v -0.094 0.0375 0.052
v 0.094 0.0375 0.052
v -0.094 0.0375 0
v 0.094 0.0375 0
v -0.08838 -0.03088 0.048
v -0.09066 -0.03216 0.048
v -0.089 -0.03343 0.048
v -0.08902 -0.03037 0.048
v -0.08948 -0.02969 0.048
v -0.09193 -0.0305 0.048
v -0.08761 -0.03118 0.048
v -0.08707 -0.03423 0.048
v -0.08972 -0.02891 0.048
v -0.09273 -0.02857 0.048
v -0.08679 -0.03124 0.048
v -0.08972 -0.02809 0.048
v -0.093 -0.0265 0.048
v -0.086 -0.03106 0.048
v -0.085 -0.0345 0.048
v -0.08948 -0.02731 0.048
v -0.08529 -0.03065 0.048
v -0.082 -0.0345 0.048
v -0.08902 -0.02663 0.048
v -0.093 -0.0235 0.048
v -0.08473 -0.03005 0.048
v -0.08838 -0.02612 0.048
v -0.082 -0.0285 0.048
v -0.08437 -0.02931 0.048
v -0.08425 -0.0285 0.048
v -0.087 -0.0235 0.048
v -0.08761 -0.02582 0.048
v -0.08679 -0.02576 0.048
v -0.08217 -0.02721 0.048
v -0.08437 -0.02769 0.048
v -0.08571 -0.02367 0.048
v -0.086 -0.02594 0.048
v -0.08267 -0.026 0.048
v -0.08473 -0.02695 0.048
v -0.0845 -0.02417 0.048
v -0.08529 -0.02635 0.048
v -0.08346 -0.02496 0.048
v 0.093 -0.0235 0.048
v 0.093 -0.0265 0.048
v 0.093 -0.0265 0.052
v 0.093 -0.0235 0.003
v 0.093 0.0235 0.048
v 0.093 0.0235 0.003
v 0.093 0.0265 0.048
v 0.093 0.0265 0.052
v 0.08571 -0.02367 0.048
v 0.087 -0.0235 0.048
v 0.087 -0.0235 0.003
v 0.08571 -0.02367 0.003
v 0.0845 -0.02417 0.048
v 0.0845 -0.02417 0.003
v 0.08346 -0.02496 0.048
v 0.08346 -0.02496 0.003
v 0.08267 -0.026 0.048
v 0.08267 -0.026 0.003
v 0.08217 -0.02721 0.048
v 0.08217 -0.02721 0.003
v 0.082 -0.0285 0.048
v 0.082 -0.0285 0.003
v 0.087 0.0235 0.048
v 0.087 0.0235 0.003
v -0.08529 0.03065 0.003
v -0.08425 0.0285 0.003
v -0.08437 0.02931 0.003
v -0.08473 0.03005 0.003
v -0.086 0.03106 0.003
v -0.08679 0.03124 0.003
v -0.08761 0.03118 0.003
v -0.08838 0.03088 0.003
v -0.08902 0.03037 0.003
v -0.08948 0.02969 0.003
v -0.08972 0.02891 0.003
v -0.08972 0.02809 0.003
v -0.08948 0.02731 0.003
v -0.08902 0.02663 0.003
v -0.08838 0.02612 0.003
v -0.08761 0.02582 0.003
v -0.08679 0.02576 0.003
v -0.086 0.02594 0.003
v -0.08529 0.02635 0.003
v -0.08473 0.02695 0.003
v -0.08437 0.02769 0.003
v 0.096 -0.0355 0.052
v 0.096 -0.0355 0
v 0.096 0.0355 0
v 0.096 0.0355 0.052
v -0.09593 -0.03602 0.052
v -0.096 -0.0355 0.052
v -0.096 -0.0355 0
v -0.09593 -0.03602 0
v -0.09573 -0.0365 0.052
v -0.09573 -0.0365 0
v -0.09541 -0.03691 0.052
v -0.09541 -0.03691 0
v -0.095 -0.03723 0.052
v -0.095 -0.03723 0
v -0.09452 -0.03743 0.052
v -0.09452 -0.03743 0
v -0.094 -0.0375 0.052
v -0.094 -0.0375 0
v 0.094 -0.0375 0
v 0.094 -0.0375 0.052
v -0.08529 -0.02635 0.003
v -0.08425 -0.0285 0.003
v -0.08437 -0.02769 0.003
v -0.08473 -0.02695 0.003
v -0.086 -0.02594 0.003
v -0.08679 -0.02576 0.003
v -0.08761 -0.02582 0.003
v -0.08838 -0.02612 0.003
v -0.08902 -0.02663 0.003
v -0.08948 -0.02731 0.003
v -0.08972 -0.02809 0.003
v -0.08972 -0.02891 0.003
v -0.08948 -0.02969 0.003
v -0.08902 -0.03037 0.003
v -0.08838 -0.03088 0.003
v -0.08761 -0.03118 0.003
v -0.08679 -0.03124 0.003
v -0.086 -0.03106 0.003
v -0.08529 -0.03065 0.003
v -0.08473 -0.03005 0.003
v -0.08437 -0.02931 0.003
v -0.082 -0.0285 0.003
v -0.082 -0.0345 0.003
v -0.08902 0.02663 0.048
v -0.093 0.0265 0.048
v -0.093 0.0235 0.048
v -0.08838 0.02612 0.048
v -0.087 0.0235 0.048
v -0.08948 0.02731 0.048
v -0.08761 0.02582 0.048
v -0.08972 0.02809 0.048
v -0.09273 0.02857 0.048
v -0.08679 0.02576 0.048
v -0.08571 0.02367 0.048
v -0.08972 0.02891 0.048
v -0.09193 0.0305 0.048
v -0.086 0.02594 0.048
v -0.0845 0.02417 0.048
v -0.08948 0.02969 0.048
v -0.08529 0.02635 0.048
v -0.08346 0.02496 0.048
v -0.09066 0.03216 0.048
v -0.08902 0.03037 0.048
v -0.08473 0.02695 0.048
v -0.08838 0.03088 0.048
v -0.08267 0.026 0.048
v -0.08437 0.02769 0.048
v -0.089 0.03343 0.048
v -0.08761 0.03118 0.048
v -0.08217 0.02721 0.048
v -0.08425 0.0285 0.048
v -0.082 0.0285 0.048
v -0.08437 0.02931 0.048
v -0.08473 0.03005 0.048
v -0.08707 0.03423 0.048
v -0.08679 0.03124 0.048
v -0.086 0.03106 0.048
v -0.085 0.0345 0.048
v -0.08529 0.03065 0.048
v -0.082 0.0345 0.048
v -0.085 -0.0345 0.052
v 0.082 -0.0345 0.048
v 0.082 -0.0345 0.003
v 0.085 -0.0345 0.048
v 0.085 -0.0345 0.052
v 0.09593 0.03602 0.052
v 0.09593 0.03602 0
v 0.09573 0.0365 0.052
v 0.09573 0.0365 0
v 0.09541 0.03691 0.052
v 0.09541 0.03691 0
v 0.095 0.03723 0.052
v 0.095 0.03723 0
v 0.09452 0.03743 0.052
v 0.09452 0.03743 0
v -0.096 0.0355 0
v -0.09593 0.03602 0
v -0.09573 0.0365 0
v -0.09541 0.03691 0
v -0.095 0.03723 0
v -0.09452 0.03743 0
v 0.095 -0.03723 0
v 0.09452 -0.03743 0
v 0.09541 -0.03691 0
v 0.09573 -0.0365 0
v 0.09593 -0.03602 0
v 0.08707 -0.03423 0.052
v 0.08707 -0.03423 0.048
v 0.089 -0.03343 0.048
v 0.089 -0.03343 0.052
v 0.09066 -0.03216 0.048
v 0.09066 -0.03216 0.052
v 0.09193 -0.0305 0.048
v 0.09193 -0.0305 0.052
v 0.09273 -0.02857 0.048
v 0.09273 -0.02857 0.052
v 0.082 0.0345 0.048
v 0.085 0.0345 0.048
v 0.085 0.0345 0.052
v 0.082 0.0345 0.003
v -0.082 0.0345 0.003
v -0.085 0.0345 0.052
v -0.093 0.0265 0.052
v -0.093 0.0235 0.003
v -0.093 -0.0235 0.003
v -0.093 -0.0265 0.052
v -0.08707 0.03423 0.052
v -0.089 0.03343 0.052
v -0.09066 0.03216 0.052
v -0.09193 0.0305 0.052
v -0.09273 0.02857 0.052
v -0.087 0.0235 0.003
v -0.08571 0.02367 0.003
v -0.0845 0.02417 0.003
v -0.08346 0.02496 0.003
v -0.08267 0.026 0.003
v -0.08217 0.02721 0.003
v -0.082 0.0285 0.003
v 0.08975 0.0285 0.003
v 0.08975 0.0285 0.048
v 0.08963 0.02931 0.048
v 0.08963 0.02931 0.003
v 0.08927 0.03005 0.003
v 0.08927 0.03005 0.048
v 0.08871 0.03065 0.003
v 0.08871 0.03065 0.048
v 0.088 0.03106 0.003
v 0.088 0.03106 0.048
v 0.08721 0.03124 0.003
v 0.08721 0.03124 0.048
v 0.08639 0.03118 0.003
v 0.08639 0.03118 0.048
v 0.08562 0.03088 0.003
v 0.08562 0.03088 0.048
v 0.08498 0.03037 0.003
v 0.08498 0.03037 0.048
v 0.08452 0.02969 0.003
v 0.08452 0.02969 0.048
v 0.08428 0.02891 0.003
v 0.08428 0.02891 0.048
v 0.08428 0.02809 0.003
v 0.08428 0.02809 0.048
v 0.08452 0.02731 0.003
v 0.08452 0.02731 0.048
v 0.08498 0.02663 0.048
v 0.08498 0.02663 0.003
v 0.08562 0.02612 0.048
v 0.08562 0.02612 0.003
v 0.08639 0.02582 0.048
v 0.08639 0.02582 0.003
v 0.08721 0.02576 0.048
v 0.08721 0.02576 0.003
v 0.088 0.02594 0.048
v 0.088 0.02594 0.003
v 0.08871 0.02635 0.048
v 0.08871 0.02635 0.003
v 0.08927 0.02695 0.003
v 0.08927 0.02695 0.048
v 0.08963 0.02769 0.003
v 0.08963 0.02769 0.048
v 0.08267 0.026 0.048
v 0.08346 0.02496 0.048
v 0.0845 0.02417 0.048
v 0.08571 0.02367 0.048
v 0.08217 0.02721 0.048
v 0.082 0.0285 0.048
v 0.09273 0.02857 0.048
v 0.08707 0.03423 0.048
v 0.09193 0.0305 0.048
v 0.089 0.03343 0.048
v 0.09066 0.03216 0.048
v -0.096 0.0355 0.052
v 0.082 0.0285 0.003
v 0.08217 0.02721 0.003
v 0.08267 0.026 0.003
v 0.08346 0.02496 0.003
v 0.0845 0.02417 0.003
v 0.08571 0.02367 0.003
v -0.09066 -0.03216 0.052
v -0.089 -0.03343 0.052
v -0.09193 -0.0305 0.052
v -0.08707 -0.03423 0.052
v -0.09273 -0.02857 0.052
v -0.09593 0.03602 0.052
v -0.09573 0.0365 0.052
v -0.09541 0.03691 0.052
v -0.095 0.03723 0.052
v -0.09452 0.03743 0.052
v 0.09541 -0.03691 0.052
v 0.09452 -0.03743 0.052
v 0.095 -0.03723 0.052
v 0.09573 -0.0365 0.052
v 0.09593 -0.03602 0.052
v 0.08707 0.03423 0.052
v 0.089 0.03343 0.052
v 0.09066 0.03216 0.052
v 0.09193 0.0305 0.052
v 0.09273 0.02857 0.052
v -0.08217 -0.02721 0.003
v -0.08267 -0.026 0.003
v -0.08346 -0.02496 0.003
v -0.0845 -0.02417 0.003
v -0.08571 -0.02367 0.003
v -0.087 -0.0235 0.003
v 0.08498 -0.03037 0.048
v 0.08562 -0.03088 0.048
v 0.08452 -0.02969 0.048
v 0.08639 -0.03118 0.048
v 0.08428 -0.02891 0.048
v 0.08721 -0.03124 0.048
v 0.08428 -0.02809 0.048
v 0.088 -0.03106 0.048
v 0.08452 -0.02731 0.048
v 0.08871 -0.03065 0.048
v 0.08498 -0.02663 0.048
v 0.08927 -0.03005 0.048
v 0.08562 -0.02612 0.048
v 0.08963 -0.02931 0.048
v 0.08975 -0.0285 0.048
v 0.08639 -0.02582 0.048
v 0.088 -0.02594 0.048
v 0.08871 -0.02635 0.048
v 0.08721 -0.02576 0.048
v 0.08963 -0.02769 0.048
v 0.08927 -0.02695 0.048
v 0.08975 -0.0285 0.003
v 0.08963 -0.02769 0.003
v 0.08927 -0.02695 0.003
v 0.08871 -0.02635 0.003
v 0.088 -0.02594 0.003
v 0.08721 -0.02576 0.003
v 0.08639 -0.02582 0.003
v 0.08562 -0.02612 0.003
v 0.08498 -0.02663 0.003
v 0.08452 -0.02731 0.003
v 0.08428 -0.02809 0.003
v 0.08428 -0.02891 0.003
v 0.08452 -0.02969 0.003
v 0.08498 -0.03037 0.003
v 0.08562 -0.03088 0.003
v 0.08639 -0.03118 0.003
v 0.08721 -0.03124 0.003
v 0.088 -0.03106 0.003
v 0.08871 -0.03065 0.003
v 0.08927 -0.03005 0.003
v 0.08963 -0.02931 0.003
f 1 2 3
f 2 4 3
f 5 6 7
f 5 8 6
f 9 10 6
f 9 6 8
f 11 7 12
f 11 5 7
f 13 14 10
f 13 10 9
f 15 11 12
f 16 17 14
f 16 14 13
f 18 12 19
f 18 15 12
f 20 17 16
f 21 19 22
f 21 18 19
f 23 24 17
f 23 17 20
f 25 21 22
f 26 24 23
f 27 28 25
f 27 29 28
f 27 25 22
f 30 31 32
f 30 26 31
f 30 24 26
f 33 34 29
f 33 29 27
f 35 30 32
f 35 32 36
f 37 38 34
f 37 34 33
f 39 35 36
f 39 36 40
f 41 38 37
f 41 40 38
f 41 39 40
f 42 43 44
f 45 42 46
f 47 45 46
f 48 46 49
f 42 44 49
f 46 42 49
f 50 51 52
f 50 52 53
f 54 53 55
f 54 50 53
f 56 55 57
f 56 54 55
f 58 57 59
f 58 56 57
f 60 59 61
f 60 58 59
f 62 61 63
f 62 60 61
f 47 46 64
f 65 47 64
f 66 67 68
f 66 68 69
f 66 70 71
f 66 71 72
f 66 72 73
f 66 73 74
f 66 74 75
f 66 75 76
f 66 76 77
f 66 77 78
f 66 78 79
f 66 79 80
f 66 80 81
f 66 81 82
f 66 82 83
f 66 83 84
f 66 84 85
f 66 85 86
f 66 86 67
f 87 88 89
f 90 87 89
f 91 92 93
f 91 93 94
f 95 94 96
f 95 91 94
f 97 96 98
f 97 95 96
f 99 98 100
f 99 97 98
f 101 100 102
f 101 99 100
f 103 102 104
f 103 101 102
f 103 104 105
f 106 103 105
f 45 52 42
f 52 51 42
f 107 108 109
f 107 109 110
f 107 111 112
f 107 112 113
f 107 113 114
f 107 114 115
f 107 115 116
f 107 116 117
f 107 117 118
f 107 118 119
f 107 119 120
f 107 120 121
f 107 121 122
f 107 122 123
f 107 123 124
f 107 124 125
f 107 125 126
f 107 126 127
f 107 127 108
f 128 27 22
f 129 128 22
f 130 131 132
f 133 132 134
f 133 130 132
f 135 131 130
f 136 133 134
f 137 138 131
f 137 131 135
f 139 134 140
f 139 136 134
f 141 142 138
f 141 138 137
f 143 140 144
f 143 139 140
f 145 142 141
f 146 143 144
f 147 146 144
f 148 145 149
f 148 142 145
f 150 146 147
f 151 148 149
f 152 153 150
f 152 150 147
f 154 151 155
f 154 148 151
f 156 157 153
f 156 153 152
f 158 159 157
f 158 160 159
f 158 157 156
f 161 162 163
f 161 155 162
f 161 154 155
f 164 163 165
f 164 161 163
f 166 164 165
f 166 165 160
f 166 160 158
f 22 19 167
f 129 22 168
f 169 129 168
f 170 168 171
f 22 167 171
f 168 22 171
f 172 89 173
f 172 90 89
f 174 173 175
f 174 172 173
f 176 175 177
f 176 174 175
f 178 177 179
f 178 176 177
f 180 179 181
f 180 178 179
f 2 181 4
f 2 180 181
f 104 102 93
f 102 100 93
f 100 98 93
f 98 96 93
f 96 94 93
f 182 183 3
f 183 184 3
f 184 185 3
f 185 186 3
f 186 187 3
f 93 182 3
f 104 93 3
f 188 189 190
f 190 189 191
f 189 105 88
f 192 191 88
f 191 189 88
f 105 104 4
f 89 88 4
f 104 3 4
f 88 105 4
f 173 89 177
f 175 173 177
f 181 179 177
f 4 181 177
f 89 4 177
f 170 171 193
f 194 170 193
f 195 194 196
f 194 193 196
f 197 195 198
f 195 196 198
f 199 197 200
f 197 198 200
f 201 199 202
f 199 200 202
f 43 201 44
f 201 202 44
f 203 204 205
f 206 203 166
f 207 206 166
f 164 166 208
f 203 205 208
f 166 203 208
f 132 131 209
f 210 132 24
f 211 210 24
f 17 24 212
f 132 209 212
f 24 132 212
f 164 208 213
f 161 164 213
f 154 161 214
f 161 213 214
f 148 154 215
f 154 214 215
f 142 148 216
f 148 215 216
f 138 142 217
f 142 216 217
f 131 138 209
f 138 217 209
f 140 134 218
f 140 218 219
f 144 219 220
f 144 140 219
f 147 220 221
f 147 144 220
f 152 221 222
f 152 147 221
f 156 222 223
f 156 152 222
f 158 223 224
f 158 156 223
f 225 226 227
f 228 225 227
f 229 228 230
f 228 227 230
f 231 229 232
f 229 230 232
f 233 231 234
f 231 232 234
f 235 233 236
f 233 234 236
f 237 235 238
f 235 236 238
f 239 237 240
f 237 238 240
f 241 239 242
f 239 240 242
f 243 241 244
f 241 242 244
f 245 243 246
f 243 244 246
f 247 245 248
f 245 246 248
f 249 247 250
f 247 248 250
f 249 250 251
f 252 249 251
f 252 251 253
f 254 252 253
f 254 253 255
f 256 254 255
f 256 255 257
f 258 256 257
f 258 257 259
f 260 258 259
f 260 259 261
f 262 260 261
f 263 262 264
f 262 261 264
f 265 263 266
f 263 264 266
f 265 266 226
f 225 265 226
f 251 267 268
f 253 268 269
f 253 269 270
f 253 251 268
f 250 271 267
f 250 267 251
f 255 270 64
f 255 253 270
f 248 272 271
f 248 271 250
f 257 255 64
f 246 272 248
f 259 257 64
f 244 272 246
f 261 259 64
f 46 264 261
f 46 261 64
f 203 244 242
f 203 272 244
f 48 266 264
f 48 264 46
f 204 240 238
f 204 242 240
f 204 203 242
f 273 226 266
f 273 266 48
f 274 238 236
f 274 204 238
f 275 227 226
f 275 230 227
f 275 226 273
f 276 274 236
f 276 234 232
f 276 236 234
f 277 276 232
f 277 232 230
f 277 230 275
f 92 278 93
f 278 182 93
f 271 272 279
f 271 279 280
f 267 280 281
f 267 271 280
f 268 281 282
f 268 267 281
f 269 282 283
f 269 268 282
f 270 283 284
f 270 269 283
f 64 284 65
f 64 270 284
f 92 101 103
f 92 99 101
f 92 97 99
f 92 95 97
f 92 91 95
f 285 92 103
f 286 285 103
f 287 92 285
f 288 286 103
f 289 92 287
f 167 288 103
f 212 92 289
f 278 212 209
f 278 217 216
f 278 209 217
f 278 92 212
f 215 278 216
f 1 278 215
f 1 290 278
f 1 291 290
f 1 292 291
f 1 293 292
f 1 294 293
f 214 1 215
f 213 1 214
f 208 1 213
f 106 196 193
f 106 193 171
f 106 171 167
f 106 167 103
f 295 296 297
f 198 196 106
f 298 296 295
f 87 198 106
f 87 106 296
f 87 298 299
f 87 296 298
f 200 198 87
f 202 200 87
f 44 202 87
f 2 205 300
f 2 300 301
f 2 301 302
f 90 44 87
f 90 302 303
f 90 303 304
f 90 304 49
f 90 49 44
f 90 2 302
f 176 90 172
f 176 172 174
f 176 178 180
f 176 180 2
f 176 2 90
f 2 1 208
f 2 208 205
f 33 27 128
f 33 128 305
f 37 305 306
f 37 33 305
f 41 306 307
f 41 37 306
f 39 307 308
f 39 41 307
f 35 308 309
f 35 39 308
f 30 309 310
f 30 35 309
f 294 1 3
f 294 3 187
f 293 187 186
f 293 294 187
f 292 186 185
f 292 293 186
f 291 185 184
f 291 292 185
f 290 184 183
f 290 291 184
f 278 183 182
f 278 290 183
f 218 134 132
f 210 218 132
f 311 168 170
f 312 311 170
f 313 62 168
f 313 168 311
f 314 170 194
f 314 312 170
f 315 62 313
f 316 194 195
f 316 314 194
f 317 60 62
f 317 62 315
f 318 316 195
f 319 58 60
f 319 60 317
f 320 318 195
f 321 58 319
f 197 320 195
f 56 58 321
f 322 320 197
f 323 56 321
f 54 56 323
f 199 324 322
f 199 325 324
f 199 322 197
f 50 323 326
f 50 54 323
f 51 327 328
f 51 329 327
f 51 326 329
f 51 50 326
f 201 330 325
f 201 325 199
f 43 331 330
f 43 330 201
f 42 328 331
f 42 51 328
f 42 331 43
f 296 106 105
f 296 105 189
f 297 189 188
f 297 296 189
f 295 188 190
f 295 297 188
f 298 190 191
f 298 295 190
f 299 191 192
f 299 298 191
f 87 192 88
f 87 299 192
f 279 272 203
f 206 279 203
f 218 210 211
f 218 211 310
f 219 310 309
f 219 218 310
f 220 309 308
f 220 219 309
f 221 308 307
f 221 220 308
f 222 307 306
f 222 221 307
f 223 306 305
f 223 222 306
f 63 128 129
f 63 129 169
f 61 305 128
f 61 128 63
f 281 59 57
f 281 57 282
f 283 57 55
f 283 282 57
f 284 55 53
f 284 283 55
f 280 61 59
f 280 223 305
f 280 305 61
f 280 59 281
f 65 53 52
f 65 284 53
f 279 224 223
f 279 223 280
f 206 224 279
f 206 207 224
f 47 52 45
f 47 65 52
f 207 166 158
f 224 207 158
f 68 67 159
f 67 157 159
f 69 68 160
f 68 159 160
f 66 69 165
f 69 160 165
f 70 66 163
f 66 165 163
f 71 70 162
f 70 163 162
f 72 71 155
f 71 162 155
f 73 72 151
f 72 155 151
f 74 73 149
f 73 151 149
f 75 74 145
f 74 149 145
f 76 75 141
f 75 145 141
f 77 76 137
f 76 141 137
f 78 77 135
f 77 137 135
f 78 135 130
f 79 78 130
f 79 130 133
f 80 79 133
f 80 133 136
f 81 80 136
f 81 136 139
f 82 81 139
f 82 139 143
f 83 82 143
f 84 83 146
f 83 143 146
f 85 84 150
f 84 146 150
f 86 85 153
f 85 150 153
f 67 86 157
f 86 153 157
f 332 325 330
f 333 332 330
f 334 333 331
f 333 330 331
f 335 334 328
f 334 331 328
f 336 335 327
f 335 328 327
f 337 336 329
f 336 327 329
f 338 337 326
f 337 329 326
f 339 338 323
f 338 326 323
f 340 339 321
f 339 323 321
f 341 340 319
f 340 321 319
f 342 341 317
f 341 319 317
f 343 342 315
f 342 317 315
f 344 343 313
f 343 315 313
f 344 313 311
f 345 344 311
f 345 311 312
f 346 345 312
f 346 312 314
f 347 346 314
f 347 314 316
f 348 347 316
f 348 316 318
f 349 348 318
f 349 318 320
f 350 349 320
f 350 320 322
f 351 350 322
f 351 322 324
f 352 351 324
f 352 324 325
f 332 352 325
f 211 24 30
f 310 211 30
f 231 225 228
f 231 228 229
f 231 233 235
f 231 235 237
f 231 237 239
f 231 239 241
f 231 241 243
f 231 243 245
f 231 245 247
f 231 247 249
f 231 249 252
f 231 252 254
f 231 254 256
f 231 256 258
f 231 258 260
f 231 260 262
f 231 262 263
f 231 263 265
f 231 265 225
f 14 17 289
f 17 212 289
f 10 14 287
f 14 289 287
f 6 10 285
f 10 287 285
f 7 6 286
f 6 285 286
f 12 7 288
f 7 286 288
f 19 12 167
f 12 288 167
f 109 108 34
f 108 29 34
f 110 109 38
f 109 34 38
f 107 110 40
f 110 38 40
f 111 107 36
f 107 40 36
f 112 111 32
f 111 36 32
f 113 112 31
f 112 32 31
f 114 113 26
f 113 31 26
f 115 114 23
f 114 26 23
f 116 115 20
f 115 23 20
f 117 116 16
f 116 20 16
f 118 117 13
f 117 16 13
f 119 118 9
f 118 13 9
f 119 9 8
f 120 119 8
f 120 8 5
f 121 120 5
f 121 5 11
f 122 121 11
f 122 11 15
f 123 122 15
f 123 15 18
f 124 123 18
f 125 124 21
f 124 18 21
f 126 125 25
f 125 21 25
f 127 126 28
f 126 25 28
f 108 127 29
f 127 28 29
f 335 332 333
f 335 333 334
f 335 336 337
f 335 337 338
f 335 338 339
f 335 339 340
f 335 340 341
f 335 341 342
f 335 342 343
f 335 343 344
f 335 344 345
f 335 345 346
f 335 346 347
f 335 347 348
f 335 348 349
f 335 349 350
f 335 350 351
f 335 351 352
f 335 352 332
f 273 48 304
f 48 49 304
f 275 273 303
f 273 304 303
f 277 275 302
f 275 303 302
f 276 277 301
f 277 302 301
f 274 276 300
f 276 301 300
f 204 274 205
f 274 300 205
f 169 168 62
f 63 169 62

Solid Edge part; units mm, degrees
sketch "Sketch1" plane through (0, 0, 0) normal (0, 0, 1) x (1, 0, 0)
  line L0 (-0.096, -0.0375) -> (0.096, -0.0375)
  line L1 (0.096, -0.0375) -> (0.096, 0.0375)
  line L2 (0.096, 0.0375) -> (-0.096, 0.0375)
  line L3 (-0.096, 0.0375) -> (-0.096, -0.0375)
  dimension "D1" = 0.192
  dimension "D2" = 0.075
extrude "Protrusion1" add sketch "Sketch1" along normal blind 0.052
sketch "Sketch2" plane through (0, 0, 0.052) normal (0, 0, 1) x (1, 0, 0)
  line L0 (-0.087, 0.0235) -> (-0.093, 0.0235)
  line L1 (-0.093, 0.0235) -> (-0.093, -0.0235)
  line L2 (-0.093, -0.0235) -> (-0.087, -0.0235)
  arc A0 (-0.087, -0.0235) -> (-0.082, -0.0285) centre (-0.087, -0.0285) cw
  line L3 (-0.082, -0.0285) -> (-0.082, -0.0345)
  line L4 (-0.082, -0.0345) -> (0.082, -0.0345)
  line L5 (0.082, -0.0345) -> (0.082, -0.0285)
  arc A1 (0.082, -0.0285) -> (0.087, -0.0235) centre (0.087, -0.0285) cw
  line L6 (0.087, -0.0235) -> (0.093, -0.0235)
  line L7 (0.093, -0.0235) -> (0.093, 0.0235)
  line L8 (0.093, 0.0235) -> (0.087, 0.0235)
  arc A2 (0.087, 0.0235) -> (0.082, 0.0285) centre (0.087, 0.0285) cw
  line L9 (0.082, 0.0285) -> (0.082, 0.0345)
  line L10 (0.082, 0.0345) -> (-0.082, 0.0345)
  line L11 (-0.082, 0.0345) -> (-0.082, 0.0285)
  arc A3 (-0.082, 0.0285) -> (-0.087, 0.0235) centre (-0.087, 0.0285) cw
  circle A4 centre (0.087, 0.0285) radius 0.00275
  circle A5 centre (0.087, -0.0285) radius 0.00275
  circle A6 centre (-0.087, -0.0285) radius 0.00275
  circle A7 centre (-0.087, 0.0285) radius 0.00275
  dimension "D1" = 0.087
  dimension "D2" = 0.087
extrude "Ausschnitt_1" cut sketch "Sketch2" against normal blind 0.049
sketch "Sketch3" plane through (0, 0, 0.052) normal (0, 0, 1) x (0, 1, 0)
  line L0 (0.0265, 0.093) -> (-0.0265, 0.093)
  arc A0 (-0.0265, 0.093) -> (-0.0345, 0.085) centre (-0.0265, 0.085) ccw
  line L1 (-0.0345, 0.085) -> (-0.0345, -0.085)
  arc A1 (-0.0265, -0.093) -> (-0.0345, -0.085) centre (-0.0265, -0.085) cw
  line L2 (-0.0265, -0.093) -> (0.0265, -0.093)
  arc A2 (0.0345, -0.085) -> (0.0265, -0.093) centre (0.0265, -0.085) cw
  line L3 (0.0345, -0.085) -> (0.0345, 0.085)
  arc A3 (0.0345, 0.085) -> (0.0265, 0.093) centre (0.0265, 0.085) ccw
extrude "Ausschnitt_2" cut sketch "Sketch3" against normal blind 0.004
fillet "Verrundung_1" radius 0.002 4 edges at (-0.096, -0.0375, 0.026) (-0.096, 0.0375, 0.026) (0.096, 0.0375, 0.026) (0.096, -0.0375, 0.026)
